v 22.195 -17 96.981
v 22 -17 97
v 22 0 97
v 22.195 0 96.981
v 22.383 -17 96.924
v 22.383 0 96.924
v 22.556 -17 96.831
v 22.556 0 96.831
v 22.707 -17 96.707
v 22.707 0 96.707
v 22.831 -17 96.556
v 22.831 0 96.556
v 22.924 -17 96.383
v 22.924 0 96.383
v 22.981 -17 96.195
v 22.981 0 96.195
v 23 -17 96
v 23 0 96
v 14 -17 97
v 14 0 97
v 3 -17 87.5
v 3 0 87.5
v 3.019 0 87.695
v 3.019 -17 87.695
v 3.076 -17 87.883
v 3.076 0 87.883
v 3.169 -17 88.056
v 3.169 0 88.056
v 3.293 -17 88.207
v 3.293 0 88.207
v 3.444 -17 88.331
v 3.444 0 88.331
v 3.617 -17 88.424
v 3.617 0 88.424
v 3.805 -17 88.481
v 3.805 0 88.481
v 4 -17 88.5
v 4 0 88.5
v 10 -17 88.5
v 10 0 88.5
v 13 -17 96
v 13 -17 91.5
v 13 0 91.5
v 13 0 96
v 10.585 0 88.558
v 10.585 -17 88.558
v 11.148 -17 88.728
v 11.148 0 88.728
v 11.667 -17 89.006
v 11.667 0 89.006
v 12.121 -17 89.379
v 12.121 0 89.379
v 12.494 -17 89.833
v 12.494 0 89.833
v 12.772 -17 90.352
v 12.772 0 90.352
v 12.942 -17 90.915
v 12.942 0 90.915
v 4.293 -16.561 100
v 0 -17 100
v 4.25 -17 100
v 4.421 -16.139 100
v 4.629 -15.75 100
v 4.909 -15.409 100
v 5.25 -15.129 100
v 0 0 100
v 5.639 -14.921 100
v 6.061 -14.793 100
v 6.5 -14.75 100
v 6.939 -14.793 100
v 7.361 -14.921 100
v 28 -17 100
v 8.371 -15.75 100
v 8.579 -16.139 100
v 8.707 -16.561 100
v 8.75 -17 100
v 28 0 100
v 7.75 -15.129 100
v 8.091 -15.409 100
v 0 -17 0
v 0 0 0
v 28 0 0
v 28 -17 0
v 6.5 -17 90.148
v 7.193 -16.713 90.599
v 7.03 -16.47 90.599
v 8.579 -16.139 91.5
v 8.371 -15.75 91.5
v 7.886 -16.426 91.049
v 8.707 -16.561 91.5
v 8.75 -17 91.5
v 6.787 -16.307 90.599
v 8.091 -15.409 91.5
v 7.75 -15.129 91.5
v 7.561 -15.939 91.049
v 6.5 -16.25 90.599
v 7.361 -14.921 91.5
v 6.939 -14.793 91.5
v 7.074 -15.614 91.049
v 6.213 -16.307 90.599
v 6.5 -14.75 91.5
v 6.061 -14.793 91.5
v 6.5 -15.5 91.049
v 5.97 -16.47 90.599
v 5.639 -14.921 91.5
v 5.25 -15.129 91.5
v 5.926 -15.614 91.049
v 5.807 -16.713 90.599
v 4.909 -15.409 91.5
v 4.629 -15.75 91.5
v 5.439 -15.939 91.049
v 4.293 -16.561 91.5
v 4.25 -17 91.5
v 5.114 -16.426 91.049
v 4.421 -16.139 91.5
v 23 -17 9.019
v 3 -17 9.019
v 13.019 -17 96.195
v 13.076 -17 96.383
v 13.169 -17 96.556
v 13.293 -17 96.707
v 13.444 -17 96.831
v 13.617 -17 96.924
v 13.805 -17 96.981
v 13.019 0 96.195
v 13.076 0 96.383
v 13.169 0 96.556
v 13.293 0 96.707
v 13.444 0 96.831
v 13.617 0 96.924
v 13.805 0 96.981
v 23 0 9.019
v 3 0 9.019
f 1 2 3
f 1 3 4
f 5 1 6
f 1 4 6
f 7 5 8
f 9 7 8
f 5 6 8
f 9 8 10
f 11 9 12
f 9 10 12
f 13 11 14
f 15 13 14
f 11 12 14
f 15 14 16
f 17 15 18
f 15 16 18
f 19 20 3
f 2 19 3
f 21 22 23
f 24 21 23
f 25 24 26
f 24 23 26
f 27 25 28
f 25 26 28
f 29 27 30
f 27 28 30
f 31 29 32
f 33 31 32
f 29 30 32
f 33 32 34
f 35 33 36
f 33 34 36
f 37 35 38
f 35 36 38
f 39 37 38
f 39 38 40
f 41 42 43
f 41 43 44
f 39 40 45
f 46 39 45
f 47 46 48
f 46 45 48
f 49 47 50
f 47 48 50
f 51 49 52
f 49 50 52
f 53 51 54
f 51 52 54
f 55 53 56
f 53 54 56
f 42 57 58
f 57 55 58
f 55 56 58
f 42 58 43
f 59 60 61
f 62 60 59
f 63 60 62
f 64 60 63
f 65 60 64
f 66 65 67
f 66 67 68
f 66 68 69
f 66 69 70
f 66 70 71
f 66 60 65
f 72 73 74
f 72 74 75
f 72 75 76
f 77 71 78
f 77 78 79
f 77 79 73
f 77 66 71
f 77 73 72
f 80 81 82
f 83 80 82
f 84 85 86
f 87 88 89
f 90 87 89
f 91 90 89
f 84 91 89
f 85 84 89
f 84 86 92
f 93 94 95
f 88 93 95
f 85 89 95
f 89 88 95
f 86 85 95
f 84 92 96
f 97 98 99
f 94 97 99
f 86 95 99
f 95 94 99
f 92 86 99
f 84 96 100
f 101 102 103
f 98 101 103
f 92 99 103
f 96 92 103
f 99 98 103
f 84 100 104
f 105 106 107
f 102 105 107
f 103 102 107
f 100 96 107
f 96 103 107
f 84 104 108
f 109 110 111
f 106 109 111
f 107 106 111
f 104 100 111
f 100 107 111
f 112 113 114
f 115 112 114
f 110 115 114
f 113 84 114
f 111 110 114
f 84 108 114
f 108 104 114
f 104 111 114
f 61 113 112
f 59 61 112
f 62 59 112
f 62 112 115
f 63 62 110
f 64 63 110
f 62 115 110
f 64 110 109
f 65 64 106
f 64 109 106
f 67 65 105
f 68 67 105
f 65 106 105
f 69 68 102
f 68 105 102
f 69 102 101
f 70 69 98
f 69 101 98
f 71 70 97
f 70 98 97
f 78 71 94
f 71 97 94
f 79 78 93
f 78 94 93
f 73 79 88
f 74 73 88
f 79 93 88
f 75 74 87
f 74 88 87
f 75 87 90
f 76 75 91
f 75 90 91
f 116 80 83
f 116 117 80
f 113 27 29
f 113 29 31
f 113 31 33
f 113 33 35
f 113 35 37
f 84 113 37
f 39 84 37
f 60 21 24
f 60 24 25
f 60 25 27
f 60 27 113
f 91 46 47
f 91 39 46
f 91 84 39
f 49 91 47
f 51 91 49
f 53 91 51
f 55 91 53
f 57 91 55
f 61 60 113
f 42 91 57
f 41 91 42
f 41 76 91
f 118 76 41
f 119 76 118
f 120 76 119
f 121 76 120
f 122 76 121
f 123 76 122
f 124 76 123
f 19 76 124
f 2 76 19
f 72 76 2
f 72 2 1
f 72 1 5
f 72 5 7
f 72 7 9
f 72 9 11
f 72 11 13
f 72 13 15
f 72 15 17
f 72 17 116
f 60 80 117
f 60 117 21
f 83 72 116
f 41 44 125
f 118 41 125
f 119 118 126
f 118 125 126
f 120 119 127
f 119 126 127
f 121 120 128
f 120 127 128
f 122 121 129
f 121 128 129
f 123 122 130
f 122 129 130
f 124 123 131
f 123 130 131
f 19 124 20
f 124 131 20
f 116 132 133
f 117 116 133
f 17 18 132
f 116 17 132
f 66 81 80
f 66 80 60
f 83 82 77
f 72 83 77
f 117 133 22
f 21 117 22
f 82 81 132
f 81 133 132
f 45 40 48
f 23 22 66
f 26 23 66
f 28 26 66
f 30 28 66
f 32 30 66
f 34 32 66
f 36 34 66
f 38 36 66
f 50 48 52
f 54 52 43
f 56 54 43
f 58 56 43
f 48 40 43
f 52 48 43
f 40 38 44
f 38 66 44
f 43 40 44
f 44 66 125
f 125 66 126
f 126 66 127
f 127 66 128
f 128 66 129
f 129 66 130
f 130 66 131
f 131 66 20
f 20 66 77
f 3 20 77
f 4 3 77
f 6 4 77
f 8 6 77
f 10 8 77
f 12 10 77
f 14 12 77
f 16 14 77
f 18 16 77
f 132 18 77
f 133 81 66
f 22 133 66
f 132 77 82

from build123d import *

# Parameters (mm, degrees)
F0_W     = 28
F0_H     = 100
F1_DEPTH = 25
F3_D     = 4.5
F3_DEPTH = 8.5
F3_TIP   = 1.3519363928
F4_W     = 28
F4_H     = 8
F5_DEPTH = 100.001


with BuildPart() as f1:
    # F0 (on Front) → F1 (new body)
    with BuildSketch(Plane.XZ):
        with Locations((14, 50)):
            Rectangle(F0_W, F0_H)
        with BuildLine():
            Line((14, 97), (22, 97))
            ThreePointArc((22, 97), (22.7071067812, 96.7071067812), (23, 96))
            Line((23, 96), (23, 9.0192308693))
            Line((23, 9.0192308693), (3, 9.0192308693))
            Line((3, 9.0192308693), (3, 87.5))
            ThreePointArc((3, 87.5), (3.2928932188, 88.2071067812), (4, 88.5))
            Line((4, 88.5), (10, 88.5))
            ThreePointArc((10, 88.5), (12.1213203436, 89.3786796564), (13, 91.5))
            Line((13, 91.5), (13, 96))
            ThreePointArc((13, 96), (13.2928932188, 96.7071067812), (14, 97))
        make_face(mode=Mode.SUBTRACT)
    extrude(amount=F1_DEPTH)

    # F3
    with Locations(Plane.XY.offset(100)):
        with Locations((6.5, -17)):
            Hole(F3_D / 2, depth=F3_DEPTH)
            with Locations((0, 0, -(F3_DEPTH + F3_TIP / 2))):  # 118° drill point
                Cone(0, F3_D / 2, F3_TIP, mode=Mode.SUBTRACT)

    # F4 (on face) → F5 (cut, through all)
    with BuildSketch(Plane.XY.offset(100)):
        with Locations((14, -21)):
            Rectangle(F4_W, F4_H)
    extrude(amount=-F5_DEPTH, mode=Mode.SUBTRACT)


solid = f1.part
